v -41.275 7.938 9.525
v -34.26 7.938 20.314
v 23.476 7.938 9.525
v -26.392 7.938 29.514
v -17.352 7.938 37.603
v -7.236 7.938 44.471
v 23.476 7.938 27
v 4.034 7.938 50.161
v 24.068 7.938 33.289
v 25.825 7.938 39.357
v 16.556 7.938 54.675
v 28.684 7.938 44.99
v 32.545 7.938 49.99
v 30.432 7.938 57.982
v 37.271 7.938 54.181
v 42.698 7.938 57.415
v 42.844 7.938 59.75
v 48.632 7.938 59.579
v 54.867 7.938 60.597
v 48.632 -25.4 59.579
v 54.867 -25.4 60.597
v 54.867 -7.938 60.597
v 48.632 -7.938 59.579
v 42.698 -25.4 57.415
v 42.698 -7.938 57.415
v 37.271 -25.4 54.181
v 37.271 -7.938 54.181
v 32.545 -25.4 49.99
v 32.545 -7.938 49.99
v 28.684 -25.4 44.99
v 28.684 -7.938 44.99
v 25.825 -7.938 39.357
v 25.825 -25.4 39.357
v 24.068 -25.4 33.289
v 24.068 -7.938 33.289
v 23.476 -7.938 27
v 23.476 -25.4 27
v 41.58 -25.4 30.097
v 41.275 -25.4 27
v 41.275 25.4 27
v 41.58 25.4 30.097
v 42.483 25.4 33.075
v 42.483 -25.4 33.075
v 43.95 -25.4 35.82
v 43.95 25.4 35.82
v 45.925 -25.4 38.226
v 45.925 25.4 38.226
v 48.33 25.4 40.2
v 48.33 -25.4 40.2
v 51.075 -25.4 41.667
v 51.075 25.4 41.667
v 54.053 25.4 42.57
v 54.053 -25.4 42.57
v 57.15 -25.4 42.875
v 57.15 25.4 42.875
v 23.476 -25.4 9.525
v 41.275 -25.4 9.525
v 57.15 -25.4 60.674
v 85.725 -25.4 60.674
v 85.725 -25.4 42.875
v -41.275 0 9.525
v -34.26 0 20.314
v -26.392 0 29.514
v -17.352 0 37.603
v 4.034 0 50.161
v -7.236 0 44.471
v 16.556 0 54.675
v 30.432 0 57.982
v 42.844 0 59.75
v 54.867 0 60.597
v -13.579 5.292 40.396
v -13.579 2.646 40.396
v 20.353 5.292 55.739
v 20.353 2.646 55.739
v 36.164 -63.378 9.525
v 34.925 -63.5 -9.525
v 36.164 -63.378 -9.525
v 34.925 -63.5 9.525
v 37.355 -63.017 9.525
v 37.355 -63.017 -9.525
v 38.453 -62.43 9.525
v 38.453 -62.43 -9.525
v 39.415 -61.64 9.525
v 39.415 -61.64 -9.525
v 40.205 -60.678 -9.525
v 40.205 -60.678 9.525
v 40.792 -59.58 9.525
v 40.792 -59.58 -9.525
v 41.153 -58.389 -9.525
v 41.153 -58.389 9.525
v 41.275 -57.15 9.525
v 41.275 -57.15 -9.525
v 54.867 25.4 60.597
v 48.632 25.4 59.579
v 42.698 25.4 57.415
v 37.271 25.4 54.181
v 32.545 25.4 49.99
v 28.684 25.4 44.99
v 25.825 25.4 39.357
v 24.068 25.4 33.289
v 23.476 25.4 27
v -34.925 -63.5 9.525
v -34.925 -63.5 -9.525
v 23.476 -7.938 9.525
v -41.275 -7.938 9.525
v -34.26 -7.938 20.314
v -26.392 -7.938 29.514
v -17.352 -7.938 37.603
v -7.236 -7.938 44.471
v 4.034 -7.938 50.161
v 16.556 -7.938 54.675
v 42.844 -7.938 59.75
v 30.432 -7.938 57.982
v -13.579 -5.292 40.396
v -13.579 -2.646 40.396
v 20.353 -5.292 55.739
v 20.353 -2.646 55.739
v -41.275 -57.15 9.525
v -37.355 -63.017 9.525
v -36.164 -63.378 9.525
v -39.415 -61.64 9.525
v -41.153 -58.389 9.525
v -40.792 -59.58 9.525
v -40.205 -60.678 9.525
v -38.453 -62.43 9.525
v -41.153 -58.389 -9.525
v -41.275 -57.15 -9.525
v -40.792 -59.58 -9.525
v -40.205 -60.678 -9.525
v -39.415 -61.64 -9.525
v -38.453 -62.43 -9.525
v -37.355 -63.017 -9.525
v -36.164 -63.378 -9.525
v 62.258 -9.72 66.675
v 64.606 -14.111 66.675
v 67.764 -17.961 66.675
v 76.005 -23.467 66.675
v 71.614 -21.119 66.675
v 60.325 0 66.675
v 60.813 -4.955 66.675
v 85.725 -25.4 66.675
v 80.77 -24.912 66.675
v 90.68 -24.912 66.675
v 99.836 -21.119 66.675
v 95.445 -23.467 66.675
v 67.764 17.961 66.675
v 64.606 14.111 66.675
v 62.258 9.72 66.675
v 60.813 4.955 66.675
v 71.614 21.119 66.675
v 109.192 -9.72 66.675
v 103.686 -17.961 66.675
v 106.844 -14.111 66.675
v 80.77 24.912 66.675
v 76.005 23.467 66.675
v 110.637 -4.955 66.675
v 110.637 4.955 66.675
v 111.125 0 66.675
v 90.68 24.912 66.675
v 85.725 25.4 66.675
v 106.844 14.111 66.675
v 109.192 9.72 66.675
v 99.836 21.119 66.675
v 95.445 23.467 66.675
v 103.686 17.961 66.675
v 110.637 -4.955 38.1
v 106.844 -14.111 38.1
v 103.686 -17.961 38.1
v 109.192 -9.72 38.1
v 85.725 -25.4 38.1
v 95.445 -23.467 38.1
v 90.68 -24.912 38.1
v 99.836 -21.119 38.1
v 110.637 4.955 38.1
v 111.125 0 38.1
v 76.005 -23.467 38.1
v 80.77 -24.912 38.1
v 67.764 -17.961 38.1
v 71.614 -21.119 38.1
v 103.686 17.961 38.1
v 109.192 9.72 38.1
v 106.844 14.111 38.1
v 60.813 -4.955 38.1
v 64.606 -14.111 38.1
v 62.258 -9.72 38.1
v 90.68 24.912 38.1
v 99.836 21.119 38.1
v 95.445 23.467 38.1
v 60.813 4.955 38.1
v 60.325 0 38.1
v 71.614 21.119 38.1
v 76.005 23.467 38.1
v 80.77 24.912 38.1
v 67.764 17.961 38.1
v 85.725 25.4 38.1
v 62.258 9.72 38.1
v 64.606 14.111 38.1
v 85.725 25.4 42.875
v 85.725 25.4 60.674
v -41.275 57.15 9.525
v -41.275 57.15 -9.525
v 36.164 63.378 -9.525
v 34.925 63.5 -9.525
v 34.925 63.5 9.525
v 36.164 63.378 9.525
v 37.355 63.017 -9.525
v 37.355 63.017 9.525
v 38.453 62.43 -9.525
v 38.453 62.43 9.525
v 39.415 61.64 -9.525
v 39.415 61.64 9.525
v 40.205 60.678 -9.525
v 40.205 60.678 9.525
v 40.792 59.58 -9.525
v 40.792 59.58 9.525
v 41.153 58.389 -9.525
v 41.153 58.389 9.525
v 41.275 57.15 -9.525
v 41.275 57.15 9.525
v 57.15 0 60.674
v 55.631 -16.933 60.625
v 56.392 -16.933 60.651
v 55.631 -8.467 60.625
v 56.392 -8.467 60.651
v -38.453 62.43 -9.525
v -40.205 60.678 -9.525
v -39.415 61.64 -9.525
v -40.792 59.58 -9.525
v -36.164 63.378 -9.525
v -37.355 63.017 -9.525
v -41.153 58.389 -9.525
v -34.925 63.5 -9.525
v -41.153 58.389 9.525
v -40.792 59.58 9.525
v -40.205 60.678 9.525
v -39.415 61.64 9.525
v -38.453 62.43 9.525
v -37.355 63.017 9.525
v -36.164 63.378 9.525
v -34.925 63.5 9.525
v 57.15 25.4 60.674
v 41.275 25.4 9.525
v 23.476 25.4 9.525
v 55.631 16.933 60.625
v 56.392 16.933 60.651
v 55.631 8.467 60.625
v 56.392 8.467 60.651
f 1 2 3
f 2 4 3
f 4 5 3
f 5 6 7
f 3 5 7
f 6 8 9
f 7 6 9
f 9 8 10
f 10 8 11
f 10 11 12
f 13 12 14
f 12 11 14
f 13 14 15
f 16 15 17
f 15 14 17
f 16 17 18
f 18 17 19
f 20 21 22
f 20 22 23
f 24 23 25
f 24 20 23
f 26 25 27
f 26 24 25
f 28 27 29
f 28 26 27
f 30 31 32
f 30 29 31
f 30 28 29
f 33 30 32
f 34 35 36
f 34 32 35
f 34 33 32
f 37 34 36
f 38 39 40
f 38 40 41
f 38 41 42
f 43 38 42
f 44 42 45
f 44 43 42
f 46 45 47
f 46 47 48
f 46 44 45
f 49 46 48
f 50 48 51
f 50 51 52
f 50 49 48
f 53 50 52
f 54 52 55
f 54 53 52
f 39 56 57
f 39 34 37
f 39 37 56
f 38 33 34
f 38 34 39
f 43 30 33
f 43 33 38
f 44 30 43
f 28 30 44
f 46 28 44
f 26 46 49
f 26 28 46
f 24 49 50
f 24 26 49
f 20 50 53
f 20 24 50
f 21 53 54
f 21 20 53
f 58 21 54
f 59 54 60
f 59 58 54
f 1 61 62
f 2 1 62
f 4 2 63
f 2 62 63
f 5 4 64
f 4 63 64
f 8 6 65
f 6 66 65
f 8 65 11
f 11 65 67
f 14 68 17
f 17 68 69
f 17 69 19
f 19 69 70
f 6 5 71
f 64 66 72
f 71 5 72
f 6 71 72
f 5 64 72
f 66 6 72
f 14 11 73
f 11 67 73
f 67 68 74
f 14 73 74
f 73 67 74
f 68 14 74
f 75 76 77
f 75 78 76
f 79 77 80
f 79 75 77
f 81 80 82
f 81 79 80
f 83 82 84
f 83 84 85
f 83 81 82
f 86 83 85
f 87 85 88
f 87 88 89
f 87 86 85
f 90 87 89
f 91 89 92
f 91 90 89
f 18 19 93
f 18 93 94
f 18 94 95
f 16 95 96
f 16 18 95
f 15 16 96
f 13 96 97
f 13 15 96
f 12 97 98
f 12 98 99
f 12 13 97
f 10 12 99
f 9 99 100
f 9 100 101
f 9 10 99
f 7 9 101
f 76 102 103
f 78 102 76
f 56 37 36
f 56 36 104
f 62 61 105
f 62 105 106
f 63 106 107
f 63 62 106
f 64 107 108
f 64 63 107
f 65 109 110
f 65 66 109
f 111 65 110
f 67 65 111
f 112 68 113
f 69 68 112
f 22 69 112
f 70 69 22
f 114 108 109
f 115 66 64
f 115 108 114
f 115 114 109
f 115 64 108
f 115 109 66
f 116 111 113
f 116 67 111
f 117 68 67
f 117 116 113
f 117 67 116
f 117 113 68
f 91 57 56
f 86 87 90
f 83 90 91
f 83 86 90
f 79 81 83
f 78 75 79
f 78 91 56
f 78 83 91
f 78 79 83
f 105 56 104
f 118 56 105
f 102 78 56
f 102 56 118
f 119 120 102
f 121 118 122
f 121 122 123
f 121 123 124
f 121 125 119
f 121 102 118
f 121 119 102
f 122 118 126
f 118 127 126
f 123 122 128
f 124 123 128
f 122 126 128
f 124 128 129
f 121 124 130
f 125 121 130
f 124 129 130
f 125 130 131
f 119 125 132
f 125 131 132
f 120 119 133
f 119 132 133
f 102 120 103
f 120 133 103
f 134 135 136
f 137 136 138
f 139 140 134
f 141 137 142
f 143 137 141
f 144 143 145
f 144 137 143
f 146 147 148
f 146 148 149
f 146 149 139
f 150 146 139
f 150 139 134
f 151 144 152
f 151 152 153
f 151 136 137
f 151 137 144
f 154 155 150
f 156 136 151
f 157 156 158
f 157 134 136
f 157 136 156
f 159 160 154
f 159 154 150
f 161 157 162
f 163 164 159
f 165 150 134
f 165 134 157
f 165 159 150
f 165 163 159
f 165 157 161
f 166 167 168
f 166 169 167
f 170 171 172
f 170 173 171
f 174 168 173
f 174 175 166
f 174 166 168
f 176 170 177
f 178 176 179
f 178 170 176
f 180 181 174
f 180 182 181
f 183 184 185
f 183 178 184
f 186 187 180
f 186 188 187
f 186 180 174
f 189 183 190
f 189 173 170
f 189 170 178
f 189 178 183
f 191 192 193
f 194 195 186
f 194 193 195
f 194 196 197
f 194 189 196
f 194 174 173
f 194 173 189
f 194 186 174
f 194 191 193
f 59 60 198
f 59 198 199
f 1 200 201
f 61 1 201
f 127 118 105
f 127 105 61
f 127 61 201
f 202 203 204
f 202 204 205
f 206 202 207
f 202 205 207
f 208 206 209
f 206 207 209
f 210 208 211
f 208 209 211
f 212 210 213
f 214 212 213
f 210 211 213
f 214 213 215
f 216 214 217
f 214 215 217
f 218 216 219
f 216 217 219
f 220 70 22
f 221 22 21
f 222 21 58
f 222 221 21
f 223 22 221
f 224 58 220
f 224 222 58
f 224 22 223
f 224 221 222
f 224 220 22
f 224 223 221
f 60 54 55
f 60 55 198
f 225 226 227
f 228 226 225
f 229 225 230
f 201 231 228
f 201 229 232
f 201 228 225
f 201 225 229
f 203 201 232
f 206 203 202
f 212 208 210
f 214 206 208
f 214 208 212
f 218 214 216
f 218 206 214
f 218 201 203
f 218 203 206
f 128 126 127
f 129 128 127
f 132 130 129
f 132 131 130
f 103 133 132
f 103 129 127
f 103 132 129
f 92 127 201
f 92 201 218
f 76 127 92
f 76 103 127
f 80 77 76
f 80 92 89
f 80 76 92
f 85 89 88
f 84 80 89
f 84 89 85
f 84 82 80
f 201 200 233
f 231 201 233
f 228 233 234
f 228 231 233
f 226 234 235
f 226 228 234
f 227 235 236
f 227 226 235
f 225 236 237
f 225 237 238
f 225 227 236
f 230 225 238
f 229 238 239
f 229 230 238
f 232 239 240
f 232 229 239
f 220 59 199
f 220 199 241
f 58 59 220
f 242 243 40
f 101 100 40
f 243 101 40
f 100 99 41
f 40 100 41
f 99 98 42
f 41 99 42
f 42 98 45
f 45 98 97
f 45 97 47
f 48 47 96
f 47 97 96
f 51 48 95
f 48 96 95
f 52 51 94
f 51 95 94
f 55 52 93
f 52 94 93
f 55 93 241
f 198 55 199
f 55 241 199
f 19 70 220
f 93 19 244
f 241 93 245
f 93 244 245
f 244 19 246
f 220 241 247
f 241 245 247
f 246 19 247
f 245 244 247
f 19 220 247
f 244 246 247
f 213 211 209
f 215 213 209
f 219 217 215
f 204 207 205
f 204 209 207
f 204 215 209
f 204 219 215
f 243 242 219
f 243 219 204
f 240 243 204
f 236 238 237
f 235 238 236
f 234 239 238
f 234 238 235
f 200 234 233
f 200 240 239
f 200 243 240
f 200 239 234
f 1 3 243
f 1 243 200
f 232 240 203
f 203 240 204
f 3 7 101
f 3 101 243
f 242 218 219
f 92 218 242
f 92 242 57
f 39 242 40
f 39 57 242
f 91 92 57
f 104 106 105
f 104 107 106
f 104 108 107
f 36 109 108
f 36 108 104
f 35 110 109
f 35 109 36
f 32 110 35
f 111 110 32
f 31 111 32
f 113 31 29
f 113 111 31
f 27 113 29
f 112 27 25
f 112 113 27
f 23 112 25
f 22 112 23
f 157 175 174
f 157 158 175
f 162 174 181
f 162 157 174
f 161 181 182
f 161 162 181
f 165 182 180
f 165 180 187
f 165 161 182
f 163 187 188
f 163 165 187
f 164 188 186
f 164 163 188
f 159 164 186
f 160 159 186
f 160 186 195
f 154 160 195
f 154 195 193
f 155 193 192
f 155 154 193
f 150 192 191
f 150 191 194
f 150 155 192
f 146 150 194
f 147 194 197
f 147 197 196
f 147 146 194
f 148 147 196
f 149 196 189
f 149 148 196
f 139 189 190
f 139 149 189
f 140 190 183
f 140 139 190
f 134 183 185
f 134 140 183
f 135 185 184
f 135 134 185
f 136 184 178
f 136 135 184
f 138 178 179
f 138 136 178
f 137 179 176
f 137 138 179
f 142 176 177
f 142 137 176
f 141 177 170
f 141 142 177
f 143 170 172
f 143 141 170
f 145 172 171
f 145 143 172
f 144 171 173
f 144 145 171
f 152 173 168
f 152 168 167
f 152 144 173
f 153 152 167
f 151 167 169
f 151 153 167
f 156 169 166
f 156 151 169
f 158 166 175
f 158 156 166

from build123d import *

# Parameters (mm, degrees)
F1_DEPTH = 63.5
F0_W     = 25.4
F0_H     = 17.7990587294
F2_DEPTH = 25.4
F3_DEPTH = 7.9375
F5_R     = 6.35


with BuildPart() as f1:
    # F0 (on Front) → F1 (new body, symmetric)
    with BuildSketch(Plane.XZ):
        Polygon((41.275, -9.525), (41.275, 9.525), (23.4759412706, 9.525), (-41.275, 9.525), (-41.275, -9.525), align=None)
    extrude(amount=F1_DEPTH, both=True)

    # F0 (on Front) → F2 (join, symmetric)
    with BuildSketch(Plane.XZ):
        with BuildLine():
            Line((23.4759412706, 9.525), (41.275, 9.525))
            Line((41.275, 9.525), (41.275, 27.0002))
            ThreePointArc((41.275, 27.0002), (45.9246798487, 38.2255201513), (57.15, 42.8752))
            Line((57.15, 42.8752), (60.325, 42.8752))
            Line((60.325, 42.8752), (60.325, 60.6742587294))
            Line((60.325, 60.6742587294), (57.15, 60.6742587294))
            add(Edge.make_bspline(
                [(54.8666908018, 60.5967583121), (55.6320096109, 60.626907703), (56.3932191874, 60.6526461412), (57.15, 60.6742587294)],
                knots=[108.4021725751, 108.4021725751, 108.4021725751, 108.4021725751, 110.9221677284, 110.9221677284, 110.9221677284, 110.9221677284], degree=3))
            ThreePointArc((54.8666908018, 60.5967583121), (32.5448123422, 49.9899144749), (23.4759412706, 27.0002))
            Line((23.4759412706, 27.0002), (23.4759412706, 9.525))
        make_face()
        with Locations((73.025, 51.7747293647)):
            Rectangle(F0_W, F0_H)
    extrude(amount=F2_DEPTH, both=True)

    # F0 (on Front) → F3 (join, symmetric)
    with BuildSketch(Plane.XZ):
        with BuildLine():
            Line((-41.275, 9.525), (23.4759412706, 9.525))
            Line((23.4759412706, 9.525), (23.4759412706, 27.0002))
            ThreePointArc((23.4759412706, 27.0002), (32.5448123422, 49.9899144749), (54.8666908018, 60.5967583121))
            add(Edge.make_bspline(
                [(-41.275, 9.525), (-18.5803843576, 49.8406641316), (21.9451109713, 59.2998274554), (54.8666908018, 60.5967583121)],
                knots=[0, 0, 0, 0, 108.4021725751, 108.4021725751, 108.4021725751, 108.4021725751], degree=3))
        make_face()
    extrude(amount=F3_DEPTH, both=True)

    # F5
    f5_edges = [f1.edges().sort_by_distance(p)[0] for p in [
        (41.275, -63.5, 0),
        (-41.275, -63.5, 0),
        (41.275, 63.5, 0),
        (-41.275, 63.5, 0),
    ]]
    fillet(f5_edges, radius=F5_R)


with BuildPart() as f4:
    # F0 (on Front) → F4 (revolve)
    with BuildSketch(Plane.XZ):
        Polygon((85.725, 60.6742587294), (85.725, 42.8752), (85.725, 38.1), (111.125, 38.1), (111.125, 66.675), (85.725, 66.675), align=None)
    revolve(axis=Axis((85.725, 0, 52.3875), (0, 0, 1)))


solid = Compound([f1.part, f4.part])
